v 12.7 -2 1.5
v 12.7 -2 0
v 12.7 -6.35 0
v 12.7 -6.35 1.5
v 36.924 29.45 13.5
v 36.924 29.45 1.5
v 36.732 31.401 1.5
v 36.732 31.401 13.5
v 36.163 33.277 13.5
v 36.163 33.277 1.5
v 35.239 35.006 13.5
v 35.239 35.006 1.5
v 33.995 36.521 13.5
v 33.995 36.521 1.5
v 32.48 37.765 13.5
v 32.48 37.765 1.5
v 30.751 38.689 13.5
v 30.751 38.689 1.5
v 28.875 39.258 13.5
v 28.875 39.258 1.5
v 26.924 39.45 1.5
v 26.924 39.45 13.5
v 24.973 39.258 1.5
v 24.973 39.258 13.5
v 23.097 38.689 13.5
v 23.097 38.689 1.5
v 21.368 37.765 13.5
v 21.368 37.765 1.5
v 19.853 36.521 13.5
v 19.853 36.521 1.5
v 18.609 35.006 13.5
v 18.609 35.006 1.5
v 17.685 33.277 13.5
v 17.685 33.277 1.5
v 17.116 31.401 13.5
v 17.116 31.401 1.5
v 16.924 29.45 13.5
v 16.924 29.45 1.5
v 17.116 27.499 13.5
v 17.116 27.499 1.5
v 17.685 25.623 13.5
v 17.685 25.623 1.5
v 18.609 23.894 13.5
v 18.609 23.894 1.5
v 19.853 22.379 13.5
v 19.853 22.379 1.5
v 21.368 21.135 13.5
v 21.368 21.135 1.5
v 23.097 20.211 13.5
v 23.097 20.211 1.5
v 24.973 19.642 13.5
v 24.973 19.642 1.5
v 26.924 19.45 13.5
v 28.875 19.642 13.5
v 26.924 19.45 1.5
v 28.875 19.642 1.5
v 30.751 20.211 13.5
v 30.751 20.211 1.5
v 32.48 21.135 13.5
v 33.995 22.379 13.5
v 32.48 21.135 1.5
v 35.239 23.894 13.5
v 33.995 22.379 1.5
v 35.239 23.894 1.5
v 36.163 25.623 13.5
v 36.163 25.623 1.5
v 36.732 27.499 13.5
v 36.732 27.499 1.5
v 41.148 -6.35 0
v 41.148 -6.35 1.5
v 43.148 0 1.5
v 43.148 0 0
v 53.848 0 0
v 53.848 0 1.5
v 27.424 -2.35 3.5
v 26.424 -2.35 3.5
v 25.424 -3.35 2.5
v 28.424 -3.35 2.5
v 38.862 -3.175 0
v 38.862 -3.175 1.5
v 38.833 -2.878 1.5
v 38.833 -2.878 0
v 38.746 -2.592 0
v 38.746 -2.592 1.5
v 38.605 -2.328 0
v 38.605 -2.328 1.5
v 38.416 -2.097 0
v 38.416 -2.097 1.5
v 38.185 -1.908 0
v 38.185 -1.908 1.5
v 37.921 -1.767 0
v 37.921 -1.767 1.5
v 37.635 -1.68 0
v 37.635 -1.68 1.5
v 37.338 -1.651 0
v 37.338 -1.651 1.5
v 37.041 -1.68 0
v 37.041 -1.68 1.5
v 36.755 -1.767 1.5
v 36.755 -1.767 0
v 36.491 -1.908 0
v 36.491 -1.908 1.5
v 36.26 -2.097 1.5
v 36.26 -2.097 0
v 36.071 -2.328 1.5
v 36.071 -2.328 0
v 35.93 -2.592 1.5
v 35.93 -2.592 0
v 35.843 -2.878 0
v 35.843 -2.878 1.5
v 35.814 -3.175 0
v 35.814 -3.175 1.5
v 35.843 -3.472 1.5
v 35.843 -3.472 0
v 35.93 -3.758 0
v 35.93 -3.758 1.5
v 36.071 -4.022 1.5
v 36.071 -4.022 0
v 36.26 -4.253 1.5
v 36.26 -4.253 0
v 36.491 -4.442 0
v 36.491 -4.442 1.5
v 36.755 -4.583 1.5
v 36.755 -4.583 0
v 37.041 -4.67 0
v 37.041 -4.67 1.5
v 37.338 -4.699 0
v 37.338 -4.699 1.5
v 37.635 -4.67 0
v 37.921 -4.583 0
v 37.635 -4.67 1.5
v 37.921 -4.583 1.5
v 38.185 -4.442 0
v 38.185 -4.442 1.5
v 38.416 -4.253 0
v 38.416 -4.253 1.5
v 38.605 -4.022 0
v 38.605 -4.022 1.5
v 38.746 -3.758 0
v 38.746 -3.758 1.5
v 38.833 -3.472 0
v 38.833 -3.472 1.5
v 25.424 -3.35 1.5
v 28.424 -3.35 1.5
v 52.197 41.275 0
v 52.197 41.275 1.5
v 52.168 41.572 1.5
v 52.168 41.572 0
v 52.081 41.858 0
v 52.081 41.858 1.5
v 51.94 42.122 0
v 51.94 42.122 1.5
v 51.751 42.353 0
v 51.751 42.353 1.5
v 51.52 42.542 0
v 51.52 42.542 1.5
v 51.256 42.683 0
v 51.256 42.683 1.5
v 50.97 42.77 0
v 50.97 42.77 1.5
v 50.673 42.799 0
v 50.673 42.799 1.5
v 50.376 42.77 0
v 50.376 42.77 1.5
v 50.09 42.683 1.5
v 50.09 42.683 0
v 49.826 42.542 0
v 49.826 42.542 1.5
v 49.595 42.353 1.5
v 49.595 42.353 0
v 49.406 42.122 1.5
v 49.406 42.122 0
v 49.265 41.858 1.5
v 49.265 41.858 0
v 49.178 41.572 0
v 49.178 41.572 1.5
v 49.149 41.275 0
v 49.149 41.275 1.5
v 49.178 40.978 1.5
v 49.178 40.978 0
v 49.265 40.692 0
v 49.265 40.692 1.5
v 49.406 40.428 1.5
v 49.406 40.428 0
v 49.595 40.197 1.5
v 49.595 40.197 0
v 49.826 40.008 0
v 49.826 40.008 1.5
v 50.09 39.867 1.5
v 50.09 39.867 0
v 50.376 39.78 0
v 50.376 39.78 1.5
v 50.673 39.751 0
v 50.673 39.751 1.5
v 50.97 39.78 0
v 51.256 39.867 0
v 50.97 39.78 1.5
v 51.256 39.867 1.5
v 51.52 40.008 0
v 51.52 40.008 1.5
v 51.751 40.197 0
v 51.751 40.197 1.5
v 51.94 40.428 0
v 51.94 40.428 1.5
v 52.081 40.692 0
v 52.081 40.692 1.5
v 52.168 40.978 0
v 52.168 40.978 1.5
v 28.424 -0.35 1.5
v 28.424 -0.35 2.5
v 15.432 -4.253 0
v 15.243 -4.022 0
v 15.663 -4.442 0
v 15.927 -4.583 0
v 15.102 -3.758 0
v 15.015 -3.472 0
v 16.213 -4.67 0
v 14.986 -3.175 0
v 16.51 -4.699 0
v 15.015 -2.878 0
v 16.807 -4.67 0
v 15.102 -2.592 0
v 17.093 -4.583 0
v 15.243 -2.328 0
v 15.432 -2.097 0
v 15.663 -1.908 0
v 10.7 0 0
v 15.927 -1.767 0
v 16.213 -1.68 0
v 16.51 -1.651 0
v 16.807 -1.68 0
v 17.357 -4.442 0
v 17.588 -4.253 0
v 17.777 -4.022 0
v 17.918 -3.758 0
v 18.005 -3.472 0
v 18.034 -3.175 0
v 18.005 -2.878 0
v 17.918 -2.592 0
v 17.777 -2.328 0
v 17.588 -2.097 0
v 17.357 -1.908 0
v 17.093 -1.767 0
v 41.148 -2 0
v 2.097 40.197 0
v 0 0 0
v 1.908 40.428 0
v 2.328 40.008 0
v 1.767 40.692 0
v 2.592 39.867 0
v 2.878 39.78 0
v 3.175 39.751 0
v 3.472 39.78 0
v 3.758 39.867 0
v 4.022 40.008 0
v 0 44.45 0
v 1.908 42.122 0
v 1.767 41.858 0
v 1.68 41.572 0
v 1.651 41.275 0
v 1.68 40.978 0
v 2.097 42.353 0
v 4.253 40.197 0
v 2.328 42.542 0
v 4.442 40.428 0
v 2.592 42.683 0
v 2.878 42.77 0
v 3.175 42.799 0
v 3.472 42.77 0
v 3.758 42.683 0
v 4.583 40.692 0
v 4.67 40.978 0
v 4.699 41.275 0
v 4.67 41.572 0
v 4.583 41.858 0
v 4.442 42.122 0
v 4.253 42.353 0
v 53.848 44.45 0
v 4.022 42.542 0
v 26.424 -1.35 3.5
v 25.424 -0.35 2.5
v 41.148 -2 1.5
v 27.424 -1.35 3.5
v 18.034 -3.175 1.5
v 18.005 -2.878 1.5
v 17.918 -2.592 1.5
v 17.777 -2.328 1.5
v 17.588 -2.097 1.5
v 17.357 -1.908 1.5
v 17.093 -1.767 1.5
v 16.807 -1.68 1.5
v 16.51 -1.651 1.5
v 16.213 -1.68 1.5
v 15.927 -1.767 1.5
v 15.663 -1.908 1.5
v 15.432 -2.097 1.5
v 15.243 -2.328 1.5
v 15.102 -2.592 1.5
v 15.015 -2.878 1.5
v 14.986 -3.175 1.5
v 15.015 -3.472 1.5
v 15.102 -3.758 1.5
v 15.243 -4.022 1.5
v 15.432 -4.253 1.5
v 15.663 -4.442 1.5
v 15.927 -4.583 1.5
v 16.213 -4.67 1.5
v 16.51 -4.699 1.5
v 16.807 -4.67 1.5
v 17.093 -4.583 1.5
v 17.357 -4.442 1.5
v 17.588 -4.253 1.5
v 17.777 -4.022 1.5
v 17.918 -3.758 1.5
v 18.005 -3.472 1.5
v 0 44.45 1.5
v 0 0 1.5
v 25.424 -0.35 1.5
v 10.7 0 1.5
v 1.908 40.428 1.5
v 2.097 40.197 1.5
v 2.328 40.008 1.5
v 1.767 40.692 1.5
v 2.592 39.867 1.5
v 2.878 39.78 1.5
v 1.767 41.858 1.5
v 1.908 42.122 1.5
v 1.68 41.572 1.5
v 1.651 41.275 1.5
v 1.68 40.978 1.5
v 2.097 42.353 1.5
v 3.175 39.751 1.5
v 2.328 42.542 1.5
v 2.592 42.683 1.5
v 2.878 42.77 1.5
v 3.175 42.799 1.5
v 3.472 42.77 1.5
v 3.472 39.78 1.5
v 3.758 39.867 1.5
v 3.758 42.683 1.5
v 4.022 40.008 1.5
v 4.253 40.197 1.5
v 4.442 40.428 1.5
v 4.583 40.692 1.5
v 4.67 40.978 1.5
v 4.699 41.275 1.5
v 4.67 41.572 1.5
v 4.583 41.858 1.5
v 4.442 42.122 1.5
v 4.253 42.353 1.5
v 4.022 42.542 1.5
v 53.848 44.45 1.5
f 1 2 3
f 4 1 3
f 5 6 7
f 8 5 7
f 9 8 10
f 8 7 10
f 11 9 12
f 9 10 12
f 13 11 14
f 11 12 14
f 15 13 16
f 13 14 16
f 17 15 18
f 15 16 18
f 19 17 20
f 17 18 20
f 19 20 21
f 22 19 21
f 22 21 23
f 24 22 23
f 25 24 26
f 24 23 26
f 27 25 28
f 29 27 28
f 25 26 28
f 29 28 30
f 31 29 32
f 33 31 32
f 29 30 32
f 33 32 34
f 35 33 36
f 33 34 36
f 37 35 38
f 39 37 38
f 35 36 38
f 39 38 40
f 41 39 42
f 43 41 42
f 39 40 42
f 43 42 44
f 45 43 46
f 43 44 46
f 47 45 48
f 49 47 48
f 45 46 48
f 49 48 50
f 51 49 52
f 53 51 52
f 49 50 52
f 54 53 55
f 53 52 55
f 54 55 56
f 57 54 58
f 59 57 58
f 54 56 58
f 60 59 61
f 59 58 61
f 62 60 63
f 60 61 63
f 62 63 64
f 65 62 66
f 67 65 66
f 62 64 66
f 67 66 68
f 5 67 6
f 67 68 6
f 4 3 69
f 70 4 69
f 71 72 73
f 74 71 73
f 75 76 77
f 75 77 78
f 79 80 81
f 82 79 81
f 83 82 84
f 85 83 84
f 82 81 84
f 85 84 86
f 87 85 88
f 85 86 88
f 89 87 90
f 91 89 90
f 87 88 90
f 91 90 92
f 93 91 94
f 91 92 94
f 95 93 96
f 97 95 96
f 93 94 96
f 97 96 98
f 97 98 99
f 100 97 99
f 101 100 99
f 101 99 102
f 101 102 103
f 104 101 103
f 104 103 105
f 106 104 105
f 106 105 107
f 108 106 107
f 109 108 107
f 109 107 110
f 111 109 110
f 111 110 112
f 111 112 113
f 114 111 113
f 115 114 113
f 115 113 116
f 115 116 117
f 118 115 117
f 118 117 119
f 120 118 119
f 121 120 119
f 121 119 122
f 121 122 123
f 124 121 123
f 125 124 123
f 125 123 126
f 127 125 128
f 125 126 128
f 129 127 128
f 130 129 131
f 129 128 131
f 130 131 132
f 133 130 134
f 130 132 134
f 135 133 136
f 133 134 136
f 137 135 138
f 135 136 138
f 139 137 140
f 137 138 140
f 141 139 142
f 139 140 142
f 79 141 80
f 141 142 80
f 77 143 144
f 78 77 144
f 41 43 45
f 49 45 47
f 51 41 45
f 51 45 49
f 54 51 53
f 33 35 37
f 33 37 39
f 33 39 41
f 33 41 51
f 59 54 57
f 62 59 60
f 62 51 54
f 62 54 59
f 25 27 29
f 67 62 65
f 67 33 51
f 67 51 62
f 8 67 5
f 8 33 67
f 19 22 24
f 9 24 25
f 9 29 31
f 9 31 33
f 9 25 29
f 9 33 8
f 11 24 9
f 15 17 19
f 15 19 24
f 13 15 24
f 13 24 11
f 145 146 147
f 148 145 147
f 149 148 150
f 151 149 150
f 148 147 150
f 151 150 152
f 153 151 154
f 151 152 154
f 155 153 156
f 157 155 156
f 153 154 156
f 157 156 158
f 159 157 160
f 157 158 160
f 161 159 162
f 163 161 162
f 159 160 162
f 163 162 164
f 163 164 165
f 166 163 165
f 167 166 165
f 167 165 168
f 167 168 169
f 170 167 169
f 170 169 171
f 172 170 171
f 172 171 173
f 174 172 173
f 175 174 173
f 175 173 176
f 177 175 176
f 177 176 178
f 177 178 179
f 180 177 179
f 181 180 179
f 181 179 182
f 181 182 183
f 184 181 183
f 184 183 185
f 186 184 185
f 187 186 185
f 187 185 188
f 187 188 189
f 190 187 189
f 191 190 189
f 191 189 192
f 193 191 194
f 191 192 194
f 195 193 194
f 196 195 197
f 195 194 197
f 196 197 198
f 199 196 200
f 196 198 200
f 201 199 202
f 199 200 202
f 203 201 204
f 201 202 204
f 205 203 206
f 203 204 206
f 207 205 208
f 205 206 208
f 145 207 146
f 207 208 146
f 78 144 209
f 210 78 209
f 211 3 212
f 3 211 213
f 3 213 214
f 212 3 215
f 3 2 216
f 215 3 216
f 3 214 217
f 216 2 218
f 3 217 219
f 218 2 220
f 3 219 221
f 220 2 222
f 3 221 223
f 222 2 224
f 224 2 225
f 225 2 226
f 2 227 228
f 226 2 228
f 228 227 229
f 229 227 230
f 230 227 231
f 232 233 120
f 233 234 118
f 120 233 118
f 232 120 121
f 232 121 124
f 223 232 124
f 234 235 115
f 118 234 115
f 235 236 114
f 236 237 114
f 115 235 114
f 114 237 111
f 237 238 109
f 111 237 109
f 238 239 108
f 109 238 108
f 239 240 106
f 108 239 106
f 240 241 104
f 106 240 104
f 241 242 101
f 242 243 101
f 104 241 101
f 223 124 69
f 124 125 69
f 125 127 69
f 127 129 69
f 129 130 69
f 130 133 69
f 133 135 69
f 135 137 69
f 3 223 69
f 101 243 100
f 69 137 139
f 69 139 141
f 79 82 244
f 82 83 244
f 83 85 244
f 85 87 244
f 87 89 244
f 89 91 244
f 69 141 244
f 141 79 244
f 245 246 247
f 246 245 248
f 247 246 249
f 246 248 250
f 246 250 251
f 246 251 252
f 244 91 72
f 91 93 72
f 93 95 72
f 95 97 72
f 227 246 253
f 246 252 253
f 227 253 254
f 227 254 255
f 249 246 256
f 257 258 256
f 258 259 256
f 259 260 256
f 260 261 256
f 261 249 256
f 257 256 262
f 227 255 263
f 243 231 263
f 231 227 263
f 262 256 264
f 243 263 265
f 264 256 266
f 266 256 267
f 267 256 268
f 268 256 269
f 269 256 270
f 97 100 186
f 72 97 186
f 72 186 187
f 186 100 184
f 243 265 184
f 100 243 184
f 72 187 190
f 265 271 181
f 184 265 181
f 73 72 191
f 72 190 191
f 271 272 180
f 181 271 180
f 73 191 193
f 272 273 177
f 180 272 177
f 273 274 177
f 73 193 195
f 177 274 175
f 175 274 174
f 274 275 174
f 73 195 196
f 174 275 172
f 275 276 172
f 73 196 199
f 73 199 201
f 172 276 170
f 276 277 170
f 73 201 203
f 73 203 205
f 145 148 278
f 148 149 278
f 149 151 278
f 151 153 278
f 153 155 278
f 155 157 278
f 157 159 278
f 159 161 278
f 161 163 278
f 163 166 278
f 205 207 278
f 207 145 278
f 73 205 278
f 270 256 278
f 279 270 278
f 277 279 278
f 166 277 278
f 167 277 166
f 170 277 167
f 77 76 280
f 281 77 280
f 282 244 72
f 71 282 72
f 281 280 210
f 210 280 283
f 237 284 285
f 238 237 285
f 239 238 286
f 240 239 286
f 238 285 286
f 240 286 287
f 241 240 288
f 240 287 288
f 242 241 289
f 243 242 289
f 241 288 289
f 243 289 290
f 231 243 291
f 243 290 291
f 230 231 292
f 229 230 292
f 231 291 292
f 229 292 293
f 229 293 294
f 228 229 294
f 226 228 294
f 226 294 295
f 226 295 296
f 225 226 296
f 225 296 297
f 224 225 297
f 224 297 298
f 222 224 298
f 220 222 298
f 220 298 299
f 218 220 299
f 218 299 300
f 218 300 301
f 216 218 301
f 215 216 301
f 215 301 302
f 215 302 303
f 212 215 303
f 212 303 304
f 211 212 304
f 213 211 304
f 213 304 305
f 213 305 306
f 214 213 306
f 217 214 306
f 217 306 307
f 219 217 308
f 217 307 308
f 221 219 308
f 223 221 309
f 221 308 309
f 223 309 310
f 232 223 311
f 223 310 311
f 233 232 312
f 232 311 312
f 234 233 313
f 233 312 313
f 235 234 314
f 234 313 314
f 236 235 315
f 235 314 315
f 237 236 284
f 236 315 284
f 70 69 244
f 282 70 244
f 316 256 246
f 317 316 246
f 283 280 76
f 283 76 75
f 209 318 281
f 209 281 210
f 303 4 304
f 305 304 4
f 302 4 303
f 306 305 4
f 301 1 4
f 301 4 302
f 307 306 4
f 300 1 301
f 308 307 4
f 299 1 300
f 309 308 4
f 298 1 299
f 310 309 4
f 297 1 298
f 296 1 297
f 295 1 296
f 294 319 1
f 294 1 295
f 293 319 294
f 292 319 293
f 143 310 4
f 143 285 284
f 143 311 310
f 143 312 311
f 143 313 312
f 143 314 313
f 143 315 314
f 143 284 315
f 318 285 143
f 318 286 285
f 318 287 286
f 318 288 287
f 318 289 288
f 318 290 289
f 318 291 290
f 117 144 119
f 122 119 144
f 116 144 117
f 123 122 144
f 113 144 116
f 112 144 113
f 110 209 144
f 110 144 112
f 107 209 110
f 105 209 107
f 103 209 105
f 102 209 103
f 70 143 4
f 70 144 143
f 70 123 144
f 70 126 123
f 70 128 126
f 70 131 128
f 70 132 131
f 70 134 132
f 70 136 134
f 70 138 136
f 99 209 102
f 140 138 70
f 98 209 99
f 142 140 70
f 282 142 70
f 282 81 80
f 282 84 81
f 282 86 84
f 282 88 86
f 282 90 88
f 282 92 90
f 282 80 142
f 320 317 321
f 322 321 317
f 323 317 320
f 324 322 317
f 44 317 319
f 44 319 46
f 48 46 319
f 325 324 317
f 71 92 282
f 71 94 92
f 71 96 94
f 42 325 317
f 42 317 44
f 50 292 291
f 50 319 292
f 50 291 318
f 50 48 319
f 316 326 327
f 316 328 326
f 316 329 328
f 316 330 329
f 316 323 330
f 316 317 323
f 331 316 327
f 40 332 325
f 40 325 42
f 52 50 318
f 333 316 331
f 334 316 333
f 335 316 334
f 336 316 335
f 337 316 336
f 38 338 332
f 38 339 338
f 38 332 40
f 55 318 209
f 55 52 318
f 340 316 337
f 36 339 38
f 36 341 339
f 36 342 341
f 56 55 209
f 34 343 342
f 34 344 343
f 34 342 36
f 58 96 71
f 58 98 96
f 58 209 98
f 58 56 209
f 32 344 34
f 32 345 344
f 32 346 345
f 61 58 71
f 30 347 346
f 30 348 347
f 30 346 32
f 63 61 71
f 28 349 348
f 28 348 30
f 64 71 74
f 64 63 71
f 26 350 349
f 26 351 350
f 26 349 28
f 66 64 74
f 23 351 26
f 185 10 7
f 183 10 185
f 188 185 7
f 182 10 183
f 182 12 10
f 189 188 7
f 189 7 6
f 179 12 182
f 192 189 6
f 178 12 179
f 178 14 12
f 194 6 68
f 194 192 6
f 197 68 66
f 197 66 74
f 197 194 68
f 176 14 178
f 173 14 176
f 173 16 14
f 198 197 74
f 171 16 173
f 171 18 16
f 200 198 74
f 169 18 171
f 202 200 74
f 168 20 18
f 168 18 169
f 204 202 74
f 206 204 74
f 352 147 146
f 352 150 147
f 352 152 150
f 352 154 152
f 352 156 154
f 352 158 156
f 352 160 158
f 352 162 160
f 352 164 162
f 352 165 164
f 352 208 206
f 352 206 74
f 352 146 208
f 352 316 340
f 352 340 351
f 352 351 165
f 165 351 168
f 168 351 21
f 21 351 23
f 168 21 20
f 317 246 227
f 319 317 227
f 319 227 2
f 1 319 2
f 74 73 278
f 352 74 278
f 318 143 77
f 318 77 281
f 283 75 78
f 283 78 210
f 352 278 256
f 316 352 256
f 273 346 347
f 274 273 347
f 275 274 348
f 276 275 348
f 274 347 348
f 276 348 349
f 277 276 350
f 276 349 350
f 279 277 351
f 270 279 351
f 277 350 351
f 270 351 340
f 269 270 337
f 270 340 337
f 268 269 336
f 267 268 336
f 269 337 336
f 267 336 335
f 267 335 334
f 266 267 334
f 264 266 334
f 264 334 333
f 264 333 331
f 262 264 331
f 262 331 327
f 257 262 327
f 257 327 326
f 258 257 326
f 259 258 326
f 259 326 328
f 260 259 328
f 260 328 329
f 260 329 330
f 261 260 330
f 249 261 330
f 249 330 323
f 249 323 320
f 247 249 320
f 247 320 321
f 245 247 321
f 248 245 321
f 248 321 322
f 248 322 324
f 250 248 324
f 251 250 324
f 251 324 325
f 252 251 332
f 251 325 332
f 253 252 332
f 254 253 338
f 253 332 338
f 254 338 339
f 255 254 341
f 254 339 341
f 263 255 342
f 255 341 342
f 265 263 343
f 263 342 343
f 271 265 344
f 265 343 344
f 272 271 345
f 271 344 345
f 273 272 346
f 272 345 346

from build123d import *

# Parameters (mm, degrees)
F1_DEPTH = 1.5
F2_R     = 1.524
F3_DEPTH = 25
F5_R     = 10
F6_DEPTH = 12
F7_W     = 3
F7_H     = 3
F8_DEPTH = 2
F9_SIZE  = 1


with BuildPart() as f1:
    # F0 (on Top) → F1 (new body)
    with BuildSketch(Plane.XY):
        Polygon((12.7, -2), (12.7, -6.35), (41.148, -6.35), (41.148, -2), (43.148, 0), (53.848, 0), (53.848, 44.45), (0, 44.45), (0, 0), (10.7, 0), align=None)
    extrude(amount=F1_DEPTH)

    # F2 (on face) → F3 (cut)
    with BuildSketch(Plane.XY.offset(1.5)):
        with Locations((3.175, 41.275)):
            Circle(F2_R)
        with Locations((50.673, 41.275)):
            Circle(F2_R)
        with Locations((16.51, -3.175)):
            Circle(F2_R)
        with Locations((37.338, -3.175)):
            Circle(F2_R)
    extrude(amount=-F3_DEPTH, mode=Mode.SUBTRACT)

    # F5 (on face) → F6 (join)
    with BuildSketch(Plane.XY.offset(1.5)):
        with Locations((26.924, 29.45)):
            Circle(F5_R)
    extrude(amount=F6_DEPTH)

    # F7 (on face) → F8 (join)
    with BuildSketch(Plane.XY.offset(1.5)):
        with Locations((26.924, -1.85)):
            Rectangle(F7_W, F7_H)
    extrude(amount=F8_DEPTH)

    # F9
    f9_edges = [f1.edges().sort_by_distance(p)[0] for p in [
        (26.924, -0.35, 3.5),
        (25.424, -1.85, 3.5),
        (28.424, -1.85, 3.5),
        (26.924, -3.35, 3.5),
    ]]
    chamfer(f9_edges, length=F9_SIZE)


solid = f1.part
